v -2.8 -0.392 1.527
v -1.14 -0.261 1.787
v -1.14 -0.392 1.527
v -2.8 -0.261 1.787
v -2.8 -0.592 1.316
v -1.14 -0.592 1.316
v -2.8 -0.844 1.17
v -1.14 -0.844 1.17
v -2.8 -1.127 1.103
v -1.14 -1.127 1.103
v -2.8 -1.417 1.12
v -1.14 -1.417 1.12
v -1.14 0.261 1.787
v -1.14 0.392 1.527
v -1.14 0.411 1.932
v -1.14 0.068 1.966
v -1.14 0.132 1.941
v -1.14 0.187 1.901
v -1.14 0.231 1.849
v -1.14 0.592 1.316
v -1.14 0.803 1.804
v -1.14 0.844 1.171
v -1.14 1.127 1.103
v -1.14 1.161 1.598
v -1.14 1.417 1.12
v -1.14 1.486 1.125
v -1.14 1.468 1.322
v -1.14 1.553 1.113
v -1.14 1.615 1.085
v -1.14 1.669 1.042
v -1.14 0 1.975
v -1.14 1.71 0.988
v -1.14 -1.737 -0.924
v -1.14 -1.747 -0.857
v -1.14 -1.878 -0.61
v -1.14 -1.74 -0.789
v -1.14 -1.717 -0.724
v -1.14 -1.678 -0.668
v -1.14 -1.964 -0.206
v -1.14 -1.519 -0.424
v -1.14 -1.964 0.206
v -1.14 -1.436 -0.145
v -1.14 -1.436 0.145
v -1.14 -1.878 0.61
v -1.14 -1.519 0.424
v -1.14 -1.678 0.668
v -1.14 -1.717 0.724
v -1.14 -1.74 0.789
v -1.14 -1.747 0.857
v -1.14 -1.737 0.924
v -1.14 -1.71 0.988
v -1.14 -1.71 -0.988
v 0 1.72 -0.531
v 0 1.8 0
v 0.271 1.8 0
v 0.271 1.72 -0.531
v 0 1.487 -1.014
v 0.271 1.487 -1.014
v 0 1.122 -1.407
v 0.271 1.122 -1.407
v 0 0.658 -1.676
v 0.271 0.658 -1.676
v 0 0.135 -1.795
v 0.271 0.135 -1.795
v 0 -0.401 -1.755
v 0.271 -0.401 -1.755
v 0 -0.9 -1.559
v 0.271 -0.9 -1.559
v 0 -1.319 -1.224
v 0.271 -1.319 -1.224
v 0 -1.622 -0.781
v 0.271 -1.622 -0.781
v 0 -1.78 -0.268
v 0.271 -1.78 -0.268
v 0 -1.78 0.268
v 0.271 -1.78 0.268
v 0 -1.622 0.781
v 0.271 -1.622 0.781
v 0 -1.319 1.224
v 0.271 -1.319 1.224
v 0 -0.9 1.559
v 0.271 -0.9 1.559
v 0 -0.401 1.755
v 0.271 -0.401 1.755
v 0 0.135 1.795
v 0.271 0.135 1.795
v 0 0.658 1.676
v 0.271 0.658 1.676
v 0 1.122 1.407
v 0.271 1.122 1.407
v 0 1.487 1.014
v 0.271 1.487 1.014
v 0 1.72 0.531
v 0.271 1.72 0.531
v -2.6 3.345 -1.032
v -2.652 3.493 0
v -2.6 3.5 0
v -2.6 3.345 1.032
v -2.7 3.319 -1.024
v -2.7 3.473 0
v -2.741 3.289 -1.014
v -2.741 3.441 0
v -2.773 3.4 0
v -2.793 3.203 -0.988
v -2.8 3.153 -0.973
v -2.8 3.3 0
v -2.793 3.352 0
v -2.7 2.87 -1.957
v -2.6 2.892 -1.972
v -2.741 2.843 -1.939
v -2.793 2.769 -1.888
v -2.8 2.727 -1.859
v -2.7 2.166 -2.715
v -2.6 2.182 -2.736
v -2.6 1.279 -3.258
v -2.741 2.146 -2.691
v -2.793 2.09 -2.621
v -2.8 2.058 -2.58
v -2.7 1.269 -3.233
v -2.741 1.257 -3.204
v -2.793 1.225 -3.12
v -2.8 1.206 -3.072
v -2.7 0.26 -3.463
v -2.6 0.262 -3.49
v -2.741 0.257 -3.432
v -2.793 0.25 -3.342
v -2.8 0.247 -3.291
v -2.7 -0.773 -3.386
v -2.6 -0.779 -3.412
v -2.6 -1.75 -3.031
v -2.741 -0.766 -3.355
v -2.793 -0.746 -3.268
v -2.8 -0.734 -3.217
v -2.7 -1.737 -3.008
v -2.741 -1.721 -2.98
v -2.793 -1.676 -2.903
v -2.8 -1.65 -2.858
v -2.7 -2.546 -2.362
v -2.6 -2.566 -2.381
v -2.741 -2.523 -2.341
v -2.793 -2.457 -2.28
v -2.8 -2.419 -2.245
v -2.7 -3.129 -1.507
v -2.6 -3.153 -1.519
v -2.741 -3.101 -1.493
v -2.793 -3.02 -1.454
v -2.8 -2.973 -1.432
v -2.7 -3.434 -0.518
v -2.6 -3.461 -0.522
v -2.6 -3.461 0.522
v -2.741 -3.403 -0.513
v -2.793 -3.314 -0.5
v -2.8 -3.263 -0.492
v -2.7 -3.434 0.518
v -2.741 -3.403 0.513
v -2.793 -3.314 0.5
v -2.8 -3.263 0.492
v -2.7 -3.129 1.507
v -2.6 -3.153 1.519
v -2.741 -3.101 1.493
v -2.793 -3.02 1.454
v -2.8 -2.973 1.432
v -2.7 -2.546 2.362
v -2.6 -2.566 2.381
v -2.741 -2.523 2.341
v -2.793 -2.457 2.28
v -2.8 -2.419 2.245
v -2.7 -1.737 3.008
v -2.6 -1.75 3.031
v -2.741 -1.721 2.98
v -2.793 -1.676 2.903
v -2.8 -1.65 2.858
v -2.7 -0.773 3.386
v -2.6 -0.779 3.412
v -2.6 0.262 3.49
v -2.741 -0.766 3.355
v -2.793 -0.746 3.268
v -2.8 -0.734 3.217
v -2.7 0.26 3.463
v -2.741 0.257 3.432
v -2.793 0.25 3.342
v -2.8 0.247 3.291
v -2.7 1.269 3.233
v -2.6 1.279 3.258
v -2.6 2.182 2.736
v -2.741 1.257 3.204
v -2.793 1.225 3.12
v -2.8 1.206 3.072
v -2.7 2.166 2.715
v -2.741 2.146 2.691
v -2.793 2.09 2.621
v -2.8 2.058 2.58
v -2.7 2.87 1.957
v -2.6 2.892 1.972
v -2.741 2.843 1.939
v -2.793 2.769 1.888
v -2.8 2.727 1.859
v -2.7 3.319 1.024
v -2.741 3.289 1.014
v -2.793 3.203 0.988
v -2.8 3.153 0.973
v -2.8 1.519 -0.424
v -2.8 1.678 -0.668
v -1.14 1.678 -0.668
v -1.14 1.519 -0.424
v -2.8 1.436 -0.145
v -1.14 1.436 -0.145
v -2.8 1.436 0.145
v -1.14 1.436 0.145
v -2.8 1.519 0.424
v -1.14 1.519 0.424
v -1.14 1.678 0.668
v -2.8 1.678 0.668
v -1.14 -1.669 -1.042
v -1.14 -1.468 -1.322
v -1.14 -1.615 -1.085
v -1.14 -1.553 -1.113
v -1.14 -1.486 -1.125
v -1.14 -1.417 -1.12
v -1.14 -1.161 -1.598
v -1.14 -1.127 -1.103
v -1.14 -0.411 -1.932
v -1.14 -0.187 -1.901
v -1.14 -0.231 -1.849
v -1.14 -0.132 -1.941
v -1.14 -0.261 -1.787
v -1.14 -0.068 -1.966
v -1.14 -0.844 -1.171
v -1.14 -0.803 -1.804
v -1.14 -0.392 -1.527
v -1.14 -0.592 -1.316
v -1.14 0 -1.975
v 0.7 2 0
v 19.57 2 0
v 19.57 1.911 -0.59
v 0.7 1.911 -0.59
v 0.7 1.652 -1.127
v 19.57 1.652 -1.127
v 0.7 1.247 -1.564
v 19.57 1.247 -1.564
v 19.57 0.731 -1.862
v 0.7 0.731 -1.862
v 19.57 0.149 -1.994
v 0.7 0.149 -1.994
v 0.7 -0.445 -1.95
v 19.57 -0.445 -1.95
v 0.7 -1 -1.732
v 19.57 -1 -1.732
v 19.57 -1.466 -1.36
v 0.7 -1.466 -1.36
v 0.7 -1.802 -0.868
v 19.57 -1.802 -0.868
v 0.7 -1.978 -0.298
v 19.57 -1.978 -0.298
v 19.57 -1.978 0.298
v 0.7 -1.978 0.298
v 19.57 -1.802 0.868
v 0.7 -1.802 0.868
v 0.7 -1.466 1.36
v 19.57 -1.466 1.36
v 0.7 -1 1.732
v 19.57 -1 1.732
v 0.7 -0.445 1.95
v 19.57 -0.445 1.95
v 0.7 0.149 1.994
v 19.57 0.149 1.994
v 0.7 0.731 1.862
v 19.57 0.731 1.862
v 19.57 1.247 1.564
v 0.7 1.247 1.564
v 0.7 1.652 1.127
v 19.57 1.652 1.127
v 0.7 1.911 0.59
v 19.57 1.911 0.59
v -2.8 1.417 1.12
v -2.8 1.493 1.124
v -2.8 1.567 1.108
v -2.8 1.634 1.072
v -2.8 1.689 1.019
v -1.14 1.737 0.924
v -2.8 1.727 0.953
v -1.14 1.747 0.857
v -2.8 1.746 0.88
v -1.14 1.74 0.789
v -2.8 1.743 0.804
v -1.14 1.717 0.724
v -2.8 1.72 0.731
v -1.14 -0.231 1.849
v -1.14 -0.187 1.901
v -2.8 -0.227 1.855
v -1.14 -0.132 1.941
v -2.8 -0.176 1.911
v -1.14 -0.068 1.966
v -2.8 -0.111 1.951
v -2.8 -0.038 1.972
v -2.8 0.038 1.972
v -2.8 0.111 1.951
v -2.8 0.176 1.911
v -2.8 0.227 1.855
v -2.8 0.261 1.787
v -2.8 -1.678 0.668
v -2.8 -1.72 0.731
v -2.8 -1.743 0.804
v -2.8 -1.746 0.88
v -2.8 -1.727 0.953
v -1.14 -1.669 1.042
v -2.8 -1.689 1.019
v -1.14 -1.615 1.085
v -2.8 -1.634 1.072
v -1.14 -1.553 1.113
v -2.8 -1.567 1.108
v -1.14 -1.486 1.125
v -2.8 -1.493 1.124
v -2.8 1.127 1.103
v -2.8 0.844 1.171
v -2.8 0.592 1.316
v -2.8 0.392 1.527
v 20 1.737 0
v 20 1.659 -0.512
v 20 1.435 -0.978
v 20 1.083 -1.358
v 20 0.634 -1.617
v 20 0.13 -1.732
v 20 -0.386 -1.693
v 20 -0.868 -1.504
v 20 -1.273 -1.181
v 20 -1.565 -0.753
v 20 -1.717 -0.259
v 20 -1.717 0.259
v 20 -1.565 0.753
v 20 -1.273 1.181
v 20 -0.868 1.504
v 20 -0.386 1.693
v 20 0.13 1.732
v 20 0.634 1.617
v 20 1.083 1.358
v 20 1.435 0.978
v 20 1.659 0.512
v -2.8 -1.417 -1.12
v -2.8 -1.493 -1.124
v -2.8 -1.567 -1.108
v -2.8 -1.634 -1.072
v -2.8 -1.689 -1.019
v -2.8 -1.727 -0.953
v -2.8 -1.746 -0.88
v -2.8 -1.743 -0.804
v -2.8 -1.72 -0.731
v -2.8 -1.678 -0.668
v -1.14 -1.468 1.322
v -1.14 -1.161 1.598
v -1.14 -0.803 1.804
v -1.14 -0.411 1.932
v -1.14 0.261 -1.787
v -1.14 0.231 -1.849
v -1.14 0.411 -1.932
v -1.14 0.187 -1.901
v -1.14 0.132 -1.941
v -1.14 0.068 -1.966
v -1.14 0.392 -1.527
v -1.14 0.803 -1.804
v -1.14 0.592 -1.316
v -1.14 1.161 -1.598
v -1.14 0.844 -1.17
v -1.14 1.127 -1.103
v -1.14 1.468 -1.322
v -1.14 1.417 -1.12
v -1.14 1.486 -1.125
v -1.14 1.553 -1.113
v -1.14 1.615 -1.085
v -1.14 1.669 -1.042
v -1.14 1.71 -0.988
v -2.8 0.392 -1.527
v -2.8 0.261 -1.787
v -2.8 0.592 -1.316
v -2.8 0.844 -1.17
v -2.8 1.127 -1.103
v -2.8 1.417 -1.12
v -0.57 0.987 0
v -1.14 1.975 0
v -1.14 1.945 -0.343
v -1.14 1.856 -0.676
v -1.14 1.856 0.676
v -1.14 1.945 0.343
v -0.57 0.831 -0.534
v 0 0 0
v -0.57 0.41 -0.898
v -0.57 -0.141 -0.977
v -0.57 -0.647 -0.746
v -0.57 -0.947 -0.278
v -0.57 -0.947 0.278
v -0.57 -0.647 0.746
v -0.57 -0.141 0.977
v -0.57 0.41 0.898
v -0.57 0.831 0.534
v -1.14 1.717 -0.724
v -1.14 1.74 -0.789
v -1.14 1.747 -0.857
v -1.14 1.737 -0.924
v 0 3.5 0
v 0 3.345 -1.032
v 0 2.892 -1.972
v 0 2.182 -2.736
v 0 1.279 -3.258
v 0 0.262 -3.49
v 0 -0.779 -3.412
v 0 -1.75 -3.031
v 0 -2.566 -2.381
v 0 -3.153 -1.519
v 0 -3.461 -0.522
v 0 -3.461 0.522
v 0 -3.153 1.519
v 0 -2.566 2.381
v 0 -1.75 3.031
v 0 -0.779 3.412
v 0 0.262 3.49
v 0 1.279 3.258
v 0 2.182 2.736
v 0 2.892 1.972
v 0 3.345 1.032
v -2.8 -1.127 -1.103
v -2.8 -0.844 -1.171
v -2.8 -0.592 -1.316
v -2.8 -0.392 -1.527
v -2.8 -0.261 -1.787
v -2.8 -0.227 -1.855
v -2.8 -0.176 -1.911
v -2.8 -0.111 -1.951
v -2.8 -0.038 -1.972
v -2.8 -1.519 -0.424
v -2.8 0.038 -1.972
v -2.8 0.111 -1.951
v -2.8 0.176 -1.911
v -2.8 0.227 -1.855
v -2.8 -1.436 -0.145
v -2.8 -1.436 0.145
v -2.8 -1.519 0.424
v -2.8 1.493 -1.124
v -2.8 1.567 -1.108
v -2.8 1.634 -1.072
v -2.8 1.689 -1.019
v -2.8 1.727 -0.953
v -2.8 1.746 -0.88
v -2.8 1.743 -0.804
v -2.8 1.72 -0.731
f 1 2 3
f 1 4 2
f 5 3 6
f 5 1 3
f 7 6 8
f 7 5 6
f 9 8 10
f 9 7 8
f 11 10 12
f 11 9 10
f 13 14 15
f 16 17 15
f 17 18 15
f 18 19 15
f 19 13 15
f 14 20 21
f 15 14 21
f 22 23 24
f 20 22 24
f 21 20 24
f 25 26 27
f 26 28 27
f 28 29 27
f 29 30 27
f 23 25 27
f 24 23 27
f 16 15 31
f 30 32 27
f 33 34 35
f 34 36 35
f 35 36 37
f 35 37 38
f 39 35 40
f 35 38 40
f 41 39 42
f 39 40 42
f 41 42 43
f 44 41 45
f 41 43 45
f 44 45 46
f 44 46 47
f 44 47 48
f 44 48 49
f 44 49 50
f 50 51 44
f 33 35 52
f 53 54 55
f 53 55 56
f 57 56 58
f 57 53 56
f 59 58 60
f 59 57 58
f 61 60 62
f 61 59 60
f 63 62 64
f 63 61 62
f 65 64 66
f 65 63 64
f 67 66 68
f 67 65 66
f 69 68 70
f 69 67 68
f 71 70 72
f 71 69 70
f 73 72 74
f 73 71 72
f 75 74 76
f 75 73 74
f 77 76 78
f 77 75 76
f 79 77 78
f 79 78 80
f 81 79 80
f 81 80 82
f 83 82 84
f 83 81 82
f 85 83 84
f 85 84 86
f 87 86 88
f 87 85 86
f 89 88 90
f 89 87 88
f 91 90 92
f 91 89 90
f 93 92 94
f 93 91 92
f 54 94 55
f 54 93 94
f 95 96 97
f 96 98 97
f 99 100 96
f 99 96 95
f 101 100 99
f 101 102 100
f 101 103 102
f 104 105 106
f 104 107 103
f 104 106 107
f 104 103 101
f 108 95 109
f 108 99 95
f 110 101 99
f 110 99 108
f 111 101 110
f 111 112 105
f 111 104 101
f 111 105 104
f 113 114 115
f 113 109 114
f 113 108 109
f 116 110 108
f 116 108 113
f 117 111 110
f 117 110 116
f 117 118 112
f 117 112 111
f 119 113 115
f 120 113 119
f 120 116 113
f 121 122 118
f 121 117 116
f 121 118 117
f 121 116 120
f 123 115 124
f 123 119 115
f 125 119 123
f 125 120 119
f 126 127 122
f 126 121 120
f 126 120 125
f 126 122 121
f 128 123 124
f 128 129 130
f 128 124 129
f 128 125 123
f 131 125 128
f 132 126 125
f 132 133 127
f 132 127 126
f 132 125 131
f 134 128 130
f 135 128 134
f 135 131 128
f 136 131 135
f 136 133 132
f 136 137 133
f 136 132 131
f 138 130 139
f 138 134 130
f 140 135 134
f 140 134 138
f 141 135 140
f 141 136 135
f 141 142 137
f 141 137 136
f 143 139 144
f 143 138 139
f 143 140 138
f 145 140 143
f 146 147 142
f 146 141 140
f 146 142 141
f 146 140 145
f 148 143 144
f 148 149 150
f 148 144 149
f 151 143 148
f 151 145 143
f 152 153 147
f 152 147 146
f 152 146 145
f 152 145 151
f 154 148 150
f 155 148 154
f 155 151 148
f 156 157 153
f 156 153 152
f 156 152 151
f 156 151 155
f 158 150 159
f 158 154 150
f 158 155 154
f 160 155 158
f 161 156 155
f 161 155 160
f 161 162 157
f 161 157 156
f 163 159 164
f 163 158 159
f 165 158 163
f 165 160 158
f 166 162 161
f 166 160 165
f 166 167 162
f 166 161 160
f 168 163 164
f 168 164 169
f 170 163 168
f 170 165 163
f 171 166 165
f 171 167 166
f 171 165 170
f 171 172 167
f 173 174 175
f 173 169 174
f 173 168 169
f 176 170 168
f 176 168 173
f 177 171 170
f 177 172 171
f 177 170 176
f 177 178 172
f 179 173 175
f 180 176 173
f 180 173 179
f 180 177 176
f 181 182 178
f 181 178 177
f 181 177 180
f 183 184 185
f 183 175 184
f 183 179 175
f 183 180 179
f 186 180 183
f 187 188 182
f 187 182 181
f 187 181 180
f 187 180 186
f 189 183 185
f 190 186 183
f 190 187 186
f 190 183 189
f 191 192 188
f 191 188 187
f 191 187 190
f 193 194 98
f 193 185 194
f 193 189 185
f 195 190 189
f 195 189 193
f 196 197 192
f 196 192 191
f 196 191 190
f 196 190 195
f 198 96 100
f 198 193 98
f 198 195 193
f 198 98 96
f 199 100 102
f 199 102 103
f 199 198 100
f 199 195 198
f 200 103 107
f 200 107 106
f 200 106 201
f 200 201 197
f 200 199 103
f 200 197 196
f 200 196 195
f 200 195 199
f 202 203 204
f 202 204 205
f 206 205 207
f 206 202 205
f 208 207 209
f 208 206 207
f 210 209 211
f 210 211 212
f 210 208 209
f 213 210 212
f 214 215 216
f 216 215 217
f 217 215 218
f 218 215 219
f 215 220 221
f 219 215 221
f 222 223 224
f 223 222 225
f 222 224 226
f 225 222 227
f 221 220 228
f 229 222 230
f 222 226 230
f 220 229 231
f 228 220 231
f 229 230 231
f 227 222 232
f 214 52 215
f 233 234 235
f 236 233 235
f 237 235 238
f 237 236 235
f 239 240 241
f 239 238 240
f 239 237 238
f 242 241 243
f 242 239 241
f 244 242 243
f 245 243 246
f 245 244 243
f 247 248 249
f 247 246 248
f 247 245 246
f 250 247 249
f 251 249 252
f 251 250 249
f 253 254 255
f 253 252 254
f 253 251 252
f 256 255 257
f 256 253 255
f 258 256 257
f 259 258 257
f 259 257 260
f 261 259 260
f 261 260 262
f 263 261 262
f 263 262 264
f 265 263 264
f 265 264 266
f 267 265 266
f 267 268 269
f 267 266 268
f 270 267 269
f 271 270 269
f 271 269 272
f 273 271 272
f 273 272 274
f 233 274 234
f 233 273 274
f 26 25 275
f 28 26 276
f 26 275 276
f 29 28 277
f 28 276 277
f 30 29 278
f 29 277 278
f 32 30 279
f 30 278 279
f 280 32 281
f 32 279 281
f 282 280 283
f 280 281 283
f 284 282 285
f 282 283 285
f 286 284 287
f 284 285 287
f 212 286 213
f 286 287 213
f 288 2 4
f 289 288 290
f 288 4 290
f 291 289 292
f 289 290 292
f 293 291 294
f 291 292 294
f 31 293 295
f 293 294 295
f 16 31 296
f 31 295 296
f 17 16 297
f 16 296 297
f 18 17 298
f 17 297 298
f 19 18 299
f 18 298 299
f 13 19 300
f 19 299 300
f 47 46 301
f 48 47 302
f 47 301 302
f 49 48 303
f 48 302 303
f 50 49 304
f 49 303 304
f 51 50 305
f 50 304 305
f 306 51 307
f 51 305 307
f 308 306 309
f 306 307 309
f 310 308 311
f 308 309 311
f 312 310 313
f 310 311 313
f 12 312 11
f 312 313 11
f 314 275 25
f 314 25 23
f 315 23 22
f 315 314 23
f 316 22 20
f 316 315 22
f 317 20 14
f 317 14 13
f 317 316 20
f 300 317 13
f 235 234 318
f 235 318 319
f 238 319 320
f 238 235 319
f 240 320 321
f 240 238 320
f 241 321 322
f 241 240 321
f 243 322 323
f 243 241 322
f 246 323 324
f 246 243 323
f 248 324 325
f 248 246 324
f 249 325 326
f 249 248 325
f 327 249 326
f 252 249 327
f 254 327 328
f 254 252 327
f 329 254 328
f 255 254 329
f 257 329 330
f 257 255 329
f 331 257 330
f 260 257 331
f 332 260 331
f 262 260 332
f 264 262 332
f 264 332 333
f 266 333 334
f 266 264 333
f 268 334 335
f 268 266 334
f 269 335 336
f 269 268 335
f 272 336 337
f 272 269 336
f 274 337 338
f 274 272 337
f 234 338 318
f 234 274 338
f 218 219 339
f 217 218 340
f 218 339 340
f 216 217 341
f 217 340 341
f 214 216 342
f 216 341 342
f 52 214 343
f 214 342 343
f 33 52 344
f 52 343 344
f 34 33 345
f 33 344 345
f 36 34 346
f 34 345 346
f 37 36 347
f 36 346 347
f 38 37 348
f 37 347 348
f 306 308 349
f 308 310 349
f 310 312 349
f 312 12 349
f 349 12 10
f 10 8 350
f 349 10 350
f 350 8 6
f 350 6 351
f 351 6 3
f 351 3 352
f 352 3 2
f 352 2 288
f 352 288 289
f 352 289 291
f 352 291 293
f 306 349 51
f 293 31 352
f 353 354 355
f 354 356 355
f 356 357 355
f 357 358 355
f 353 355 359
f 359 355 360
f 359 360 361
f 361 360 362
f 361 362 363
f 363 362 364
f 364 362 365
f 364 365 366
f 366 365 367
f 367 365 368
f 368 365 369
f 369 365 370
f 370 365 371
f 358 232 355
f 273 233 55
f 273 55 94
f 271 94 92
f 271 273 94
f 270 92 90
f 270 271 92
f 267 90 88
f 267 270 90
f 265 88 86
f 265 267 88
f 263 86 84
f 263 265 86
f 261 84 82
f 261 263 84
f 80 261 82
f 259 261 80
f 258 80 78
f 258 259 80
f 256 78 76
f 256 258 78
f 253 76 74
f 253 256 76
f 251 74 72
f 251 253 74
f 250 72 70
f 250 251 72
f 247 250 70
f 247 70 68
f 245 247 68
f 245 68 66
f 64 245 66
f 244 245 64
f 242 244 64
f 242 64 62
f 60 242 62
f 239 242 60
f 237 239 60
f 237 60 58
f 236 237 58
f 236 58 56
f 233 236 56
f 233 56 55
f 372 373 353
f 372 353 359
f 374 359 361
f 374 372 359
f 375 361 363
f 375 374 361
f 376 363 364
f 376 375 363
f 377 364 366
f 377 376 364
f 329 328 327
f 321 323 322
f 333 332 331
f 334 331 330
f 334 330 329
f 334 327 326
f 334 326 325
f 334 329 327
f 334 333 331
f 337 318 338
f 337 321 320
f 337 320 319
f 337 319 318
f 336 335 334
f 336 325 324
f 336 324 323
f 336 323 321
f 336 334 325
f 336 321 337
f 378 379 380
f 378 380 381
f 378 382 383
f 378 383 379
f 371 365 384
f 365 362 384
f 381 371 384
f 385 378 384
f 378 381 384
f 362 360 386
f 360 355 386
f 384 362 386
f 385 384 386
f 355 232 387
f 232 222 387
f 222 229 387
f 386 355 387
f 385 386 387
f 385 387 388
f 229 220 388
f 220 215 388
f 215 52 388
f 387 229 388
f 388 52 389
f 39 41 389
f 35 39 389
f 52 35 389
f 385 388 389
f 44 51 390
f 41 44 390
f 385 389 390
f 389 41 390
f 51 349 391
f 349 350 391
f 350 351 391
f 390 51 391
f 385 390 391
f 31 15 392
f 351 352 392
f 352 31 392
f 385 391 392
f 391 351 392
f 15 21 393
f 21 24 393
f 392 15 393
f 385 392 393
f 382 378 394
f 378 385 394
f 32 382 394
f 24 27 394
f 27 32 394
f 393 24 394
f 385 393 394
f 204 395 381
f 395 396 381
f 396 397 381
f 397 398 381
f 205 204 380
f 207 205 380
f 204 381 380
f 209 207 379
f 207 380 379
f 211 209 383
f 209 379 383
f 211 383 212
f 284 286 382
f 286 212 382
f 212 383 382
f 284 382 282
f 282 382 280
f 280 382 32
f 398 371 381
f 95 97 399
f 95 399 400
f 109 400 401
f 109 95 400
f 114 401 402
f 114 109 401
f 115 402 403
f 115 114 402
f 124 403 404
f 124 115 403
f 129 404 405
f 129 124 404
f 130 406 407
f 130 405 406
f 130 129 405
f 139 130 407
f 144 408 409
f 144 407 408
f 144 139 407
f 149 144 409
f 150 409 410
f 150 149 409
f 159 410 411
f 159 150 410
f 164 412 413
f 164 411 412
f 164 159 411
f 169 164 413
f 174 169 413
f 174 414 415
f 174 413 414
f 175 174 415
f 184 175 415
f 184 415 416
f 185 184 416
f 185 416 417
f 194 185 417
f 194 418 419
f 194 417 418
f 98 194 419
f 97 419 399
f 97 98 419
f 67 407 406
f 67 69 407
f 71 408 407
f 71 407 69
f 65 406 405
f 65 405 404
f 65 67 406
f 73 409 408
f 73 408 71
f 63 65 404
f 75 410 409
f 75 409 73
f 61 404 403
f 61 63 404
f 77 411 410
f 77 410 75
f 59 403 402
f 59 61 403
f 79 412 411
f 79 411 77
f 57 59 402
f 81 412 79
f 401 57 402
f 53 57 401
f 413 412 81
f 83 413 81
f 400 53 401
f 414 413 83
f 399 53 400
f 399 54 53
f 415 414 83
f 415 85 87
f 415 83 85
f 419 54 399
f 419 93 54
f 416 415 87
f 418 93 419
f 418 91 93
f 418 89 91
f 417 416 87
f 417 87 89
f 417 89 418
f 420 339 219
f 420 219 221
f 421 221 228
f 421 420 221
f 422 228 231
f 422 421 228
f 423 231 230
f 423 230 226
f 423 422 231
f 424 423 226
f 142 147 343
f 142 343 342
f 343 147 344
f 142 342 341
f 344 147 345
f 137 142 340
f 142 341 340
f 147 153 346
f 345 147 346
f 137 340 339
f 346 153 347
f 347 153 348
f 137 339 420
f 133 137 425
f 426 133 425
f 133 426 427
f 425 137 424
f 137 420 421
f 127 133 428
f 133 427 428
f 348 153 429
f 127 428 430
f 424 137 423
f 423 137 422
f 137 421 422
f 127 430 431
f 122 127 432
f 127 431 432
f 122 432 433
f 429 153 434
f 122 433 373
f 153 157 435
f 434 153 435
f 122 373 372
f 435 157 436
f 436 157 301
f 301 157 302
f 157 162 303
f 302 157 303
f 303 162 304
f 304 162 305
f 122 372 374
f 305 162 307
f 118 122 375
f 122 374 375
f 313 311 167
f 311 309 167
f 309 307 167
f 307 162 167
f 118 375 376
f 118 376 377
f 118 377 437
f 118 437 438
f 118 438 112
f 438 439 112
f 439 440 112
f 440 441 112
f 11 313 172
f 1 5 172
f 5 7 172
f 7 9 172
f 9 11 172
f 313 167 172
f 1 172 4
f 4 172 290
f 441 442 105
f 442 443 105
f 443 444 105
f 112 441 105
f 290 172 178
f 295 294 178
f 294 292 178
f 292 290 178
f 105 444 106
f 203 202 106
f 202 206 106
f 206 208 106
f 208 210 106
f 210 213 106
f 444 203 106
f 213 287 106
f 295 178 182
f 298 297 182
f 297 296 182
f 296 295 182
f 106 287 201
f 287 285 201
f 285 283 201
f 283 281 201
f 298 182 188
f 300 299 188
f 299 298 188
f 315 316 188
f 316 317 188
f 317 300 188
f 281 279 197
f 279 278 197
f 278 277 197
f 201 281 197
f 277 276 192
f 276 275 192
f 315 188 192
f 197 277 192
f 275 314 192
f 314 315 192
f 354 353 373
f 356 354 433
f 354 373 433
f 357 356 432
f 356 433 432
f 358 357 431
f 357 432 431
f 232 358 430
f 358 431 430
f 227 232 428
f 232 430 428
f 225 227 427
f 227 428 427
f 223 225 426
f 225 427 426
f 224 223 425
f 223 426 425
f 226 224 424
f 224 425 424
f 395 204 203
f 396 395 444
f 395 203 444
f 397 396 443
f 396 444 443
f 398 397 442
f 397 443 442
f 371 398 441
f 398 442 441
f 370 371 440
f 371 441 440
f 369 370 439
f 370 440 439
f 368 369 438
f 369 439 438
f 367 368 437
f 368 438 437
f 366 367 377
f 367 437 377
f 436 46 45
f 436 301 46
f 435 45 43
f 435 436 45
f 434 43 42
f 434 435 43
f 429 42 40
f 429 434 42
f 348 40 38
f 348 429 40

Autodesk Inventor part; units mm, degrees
ref_plane "YZ Plane" through (0, 0, 0) normal (1, 0, 0) x (0, 1, 0)
ref_plane "XZ Plane" through (0, 0, 0) normal (0, 1, 0) x (-1, 0, 0)
sketch "Szkic1" plane through (0, 0, 0) normal (0, 0, 1) x (1, 0, 0)
  line L0 (0.0003, 0) -> (20, 0)
  line L1 (20, 0) -> (20, 2)
  line L2 (20, 2) -> (0.7, 2)
  line L3 (0.7, 2) -> (0.2706, 1.8)
  line L4 (0.2706, 1.8) -> (0, 1.8)
  line L5 (0, 1.8) -> (0, 3.5)
  line L6 (0, 3.5) -> (-2.8, 3.5)
  line L7 (-2.8, 3.5) -> (-2.8, 1.975)
  line L8 (-2.8, 1.975) -> (-1.14, 1.975)
  line L9 (-1.14, 1.975) -> (0.0003, 0)
  line L10 (-7.36, 0) -> (24.56, 0) projected
  line L11 (0, -0.7) -> (0, 4.2) projected
  line L12 (0.7, 2) -> (0, 2) construction
  dimension "d1" = 19.3
  dimension "d2" = 0.4294
  dimension "d3" = 2.8
  dimension "d4" = 1.66
  dimension "d5" = 60
  dimension "d6" = 4
  dimension "d7" = 3.6
  dimension "d8" = 3.95
  dimension "d9" = 7
  dimension "d20" = 20
revolve "Bryła" add sketch "Szkic1" angle 360 about axis through (0.0003, 0, 0) along (1, 0, 0)
sketch "Szkic2" plane through (-2.8, 0, 0) normal (-1, 0, 0) x (0, 0, 1)
  line L0 (0, -4.9) -> (0, 4.9) projected
  line L1 (-4.9, 0) -> (4.9, 0) projected
  circle A0 centre (0, 0) radius 1.975 construction
  circle A1 centre (0, 0) radius 1.425 construction
  line L2 (0, 0) -> (1.7104, 0.9875) construction
  line L3 (0, 0) -> (0.9875, 1.7104) construction
  arc A2 (1.1195, 1.4173) -> (0.6677, 1.6781) centre (0.85, 1.4722) ccw
  arc A3 (1.1195, 1.4173) -> (1.7871, 0.2608) centre (2.1063, 1.2161) ccw
  arc A4 (1.7871, -0.2608) -> (1.7871, 0.2608) centre (1.7, 0) ccw
  arc A5 (1.7871, -0.2608) -> (1.1195, -1.4173) centre (2.1063, -1.2161) ccw
  arc A6 (-0.6677, 1.6781) -> (0.6677, 1.6781) centre (0, 2.4322) ccw
  arc A7 (-0.6677, 1.6781) -> (-1.1195, 1.4173) centre (-0.85, 1.4722) ccw
  arc A8 (-1.7871, 0.2608) -> (-1.1195, 1.4173) centre (-2.1063, 1.2161) ccw
  arc A9 (-1.7871, 0.2608) -> (-1.7871, -0.2608) centre (-1.7, 0) ccw
  arc A10 (-1.1195, -1.4173) -> (-1.7871, -0.2608) centre (-2.1063, -1.2161) ccw
  arc A11 (0.6677, -1.6781) -> (1.1195, -1.4173) centre (0.85, -1.4722) ccw
  arc A12 (0.6677, -1.6781) -> (-0.6677, -1.6781) centre (0, -2.4322) ccw
  arc A13 (-1.1195, -1.4173) -> (-0.6677, -1.6781) centre (-0.85, -1.4722) ccw
  circle A14 centre (0, 0) radius 1.975 projected
  dimension "d34" = 30
  dimension "d35" = 60
  dimension "d36" = 2.85
  dimension "d37" = 3.95
  dimension "d38" = 0.275
extrude "Szczelina" add sketch "Szkic2" against normal blind 1.66 contours A14 A13 A12 L0 | L0 A12 A11 A14 | A14 A9 A10 A13 | A11 A5 A4 A14 | A14 A7 A8 A9 | A4 A3 A2 A14 | A6 A7 A14 L0 | L0 A14 A2 A6
fillet "Zaokrąglenie1" radius 0.2 1 edges at (-2.8, -3.5, 0)
thread "Gwint" size "M4x0.7" class "6g" standard "ISO Metric profile" length 19.3
chamfer "Faza1" distance 0.2634 distance2 0.4295 1 edges at (20, -2, 0) measured on face at (20, 0.527, -0.2661)
ref_plane "Work Plane1" through (10.35, 0, 0) normal (0, -0.6335, -0.7737) x (1, 0, 0)
equation "\"d1\" = GEL"
equation "\"d2\" = GAL"
equation "\"d3\" = KOH"
equation "\"d4\" = INTI"
equation "\"d6\" = GD"
equation "\"d7\" = BDM"
equation "\"d8\" = SW"
equation "\"d9\" = KOD"
equation "\"d20\" = NLG"
equation "\"d36\" = E0"
equation "\"d37\" = SW"
equation "\"d38\" = -0.25 * E0 + 0.25 * SW"
equation "\"d11\" = INTI"
equation "\"d17\" = RR"
equation "\"d13\" = GEL"
equation "\"d15\" = -0.5 * SPD + 0.5 * GD"
equation "\"GD\" = NND"
equation "\"NLG\" = 20"
equation "\"GEL\" = 19.3"
equation "\"KOD\" = 7"
equation "\"KOH\" = 2.8"
equation "\"INTI\" = 1.66"
equation "\"GAL\" = 0.61345 * PTC"
equation "\"GUL\" = 0.61345 * PTC"
equation "\"BDM\" = 3.6"
equation "\"SW\" = 3.95"
equation "\"RR\" = 0.2"
equation "\"SPD\" = NND - 1.2269 * GAL"
equation "\"E0\" = 2.85"
equation "\"TOA\" = 30deg"
equation "\"GD1\" = THREADDIA - 1.2269 * PTC"
equation "\"THREADDIA\" = 4"
equation "\"PTC\" = 0.7"
equation "\"NND\" = 4"
equation "\"RRK\" = 0.29"
properties part number "NF E 25-111 - M4x20 Klasa właściwości 4.8" material "Stal, miękka"
